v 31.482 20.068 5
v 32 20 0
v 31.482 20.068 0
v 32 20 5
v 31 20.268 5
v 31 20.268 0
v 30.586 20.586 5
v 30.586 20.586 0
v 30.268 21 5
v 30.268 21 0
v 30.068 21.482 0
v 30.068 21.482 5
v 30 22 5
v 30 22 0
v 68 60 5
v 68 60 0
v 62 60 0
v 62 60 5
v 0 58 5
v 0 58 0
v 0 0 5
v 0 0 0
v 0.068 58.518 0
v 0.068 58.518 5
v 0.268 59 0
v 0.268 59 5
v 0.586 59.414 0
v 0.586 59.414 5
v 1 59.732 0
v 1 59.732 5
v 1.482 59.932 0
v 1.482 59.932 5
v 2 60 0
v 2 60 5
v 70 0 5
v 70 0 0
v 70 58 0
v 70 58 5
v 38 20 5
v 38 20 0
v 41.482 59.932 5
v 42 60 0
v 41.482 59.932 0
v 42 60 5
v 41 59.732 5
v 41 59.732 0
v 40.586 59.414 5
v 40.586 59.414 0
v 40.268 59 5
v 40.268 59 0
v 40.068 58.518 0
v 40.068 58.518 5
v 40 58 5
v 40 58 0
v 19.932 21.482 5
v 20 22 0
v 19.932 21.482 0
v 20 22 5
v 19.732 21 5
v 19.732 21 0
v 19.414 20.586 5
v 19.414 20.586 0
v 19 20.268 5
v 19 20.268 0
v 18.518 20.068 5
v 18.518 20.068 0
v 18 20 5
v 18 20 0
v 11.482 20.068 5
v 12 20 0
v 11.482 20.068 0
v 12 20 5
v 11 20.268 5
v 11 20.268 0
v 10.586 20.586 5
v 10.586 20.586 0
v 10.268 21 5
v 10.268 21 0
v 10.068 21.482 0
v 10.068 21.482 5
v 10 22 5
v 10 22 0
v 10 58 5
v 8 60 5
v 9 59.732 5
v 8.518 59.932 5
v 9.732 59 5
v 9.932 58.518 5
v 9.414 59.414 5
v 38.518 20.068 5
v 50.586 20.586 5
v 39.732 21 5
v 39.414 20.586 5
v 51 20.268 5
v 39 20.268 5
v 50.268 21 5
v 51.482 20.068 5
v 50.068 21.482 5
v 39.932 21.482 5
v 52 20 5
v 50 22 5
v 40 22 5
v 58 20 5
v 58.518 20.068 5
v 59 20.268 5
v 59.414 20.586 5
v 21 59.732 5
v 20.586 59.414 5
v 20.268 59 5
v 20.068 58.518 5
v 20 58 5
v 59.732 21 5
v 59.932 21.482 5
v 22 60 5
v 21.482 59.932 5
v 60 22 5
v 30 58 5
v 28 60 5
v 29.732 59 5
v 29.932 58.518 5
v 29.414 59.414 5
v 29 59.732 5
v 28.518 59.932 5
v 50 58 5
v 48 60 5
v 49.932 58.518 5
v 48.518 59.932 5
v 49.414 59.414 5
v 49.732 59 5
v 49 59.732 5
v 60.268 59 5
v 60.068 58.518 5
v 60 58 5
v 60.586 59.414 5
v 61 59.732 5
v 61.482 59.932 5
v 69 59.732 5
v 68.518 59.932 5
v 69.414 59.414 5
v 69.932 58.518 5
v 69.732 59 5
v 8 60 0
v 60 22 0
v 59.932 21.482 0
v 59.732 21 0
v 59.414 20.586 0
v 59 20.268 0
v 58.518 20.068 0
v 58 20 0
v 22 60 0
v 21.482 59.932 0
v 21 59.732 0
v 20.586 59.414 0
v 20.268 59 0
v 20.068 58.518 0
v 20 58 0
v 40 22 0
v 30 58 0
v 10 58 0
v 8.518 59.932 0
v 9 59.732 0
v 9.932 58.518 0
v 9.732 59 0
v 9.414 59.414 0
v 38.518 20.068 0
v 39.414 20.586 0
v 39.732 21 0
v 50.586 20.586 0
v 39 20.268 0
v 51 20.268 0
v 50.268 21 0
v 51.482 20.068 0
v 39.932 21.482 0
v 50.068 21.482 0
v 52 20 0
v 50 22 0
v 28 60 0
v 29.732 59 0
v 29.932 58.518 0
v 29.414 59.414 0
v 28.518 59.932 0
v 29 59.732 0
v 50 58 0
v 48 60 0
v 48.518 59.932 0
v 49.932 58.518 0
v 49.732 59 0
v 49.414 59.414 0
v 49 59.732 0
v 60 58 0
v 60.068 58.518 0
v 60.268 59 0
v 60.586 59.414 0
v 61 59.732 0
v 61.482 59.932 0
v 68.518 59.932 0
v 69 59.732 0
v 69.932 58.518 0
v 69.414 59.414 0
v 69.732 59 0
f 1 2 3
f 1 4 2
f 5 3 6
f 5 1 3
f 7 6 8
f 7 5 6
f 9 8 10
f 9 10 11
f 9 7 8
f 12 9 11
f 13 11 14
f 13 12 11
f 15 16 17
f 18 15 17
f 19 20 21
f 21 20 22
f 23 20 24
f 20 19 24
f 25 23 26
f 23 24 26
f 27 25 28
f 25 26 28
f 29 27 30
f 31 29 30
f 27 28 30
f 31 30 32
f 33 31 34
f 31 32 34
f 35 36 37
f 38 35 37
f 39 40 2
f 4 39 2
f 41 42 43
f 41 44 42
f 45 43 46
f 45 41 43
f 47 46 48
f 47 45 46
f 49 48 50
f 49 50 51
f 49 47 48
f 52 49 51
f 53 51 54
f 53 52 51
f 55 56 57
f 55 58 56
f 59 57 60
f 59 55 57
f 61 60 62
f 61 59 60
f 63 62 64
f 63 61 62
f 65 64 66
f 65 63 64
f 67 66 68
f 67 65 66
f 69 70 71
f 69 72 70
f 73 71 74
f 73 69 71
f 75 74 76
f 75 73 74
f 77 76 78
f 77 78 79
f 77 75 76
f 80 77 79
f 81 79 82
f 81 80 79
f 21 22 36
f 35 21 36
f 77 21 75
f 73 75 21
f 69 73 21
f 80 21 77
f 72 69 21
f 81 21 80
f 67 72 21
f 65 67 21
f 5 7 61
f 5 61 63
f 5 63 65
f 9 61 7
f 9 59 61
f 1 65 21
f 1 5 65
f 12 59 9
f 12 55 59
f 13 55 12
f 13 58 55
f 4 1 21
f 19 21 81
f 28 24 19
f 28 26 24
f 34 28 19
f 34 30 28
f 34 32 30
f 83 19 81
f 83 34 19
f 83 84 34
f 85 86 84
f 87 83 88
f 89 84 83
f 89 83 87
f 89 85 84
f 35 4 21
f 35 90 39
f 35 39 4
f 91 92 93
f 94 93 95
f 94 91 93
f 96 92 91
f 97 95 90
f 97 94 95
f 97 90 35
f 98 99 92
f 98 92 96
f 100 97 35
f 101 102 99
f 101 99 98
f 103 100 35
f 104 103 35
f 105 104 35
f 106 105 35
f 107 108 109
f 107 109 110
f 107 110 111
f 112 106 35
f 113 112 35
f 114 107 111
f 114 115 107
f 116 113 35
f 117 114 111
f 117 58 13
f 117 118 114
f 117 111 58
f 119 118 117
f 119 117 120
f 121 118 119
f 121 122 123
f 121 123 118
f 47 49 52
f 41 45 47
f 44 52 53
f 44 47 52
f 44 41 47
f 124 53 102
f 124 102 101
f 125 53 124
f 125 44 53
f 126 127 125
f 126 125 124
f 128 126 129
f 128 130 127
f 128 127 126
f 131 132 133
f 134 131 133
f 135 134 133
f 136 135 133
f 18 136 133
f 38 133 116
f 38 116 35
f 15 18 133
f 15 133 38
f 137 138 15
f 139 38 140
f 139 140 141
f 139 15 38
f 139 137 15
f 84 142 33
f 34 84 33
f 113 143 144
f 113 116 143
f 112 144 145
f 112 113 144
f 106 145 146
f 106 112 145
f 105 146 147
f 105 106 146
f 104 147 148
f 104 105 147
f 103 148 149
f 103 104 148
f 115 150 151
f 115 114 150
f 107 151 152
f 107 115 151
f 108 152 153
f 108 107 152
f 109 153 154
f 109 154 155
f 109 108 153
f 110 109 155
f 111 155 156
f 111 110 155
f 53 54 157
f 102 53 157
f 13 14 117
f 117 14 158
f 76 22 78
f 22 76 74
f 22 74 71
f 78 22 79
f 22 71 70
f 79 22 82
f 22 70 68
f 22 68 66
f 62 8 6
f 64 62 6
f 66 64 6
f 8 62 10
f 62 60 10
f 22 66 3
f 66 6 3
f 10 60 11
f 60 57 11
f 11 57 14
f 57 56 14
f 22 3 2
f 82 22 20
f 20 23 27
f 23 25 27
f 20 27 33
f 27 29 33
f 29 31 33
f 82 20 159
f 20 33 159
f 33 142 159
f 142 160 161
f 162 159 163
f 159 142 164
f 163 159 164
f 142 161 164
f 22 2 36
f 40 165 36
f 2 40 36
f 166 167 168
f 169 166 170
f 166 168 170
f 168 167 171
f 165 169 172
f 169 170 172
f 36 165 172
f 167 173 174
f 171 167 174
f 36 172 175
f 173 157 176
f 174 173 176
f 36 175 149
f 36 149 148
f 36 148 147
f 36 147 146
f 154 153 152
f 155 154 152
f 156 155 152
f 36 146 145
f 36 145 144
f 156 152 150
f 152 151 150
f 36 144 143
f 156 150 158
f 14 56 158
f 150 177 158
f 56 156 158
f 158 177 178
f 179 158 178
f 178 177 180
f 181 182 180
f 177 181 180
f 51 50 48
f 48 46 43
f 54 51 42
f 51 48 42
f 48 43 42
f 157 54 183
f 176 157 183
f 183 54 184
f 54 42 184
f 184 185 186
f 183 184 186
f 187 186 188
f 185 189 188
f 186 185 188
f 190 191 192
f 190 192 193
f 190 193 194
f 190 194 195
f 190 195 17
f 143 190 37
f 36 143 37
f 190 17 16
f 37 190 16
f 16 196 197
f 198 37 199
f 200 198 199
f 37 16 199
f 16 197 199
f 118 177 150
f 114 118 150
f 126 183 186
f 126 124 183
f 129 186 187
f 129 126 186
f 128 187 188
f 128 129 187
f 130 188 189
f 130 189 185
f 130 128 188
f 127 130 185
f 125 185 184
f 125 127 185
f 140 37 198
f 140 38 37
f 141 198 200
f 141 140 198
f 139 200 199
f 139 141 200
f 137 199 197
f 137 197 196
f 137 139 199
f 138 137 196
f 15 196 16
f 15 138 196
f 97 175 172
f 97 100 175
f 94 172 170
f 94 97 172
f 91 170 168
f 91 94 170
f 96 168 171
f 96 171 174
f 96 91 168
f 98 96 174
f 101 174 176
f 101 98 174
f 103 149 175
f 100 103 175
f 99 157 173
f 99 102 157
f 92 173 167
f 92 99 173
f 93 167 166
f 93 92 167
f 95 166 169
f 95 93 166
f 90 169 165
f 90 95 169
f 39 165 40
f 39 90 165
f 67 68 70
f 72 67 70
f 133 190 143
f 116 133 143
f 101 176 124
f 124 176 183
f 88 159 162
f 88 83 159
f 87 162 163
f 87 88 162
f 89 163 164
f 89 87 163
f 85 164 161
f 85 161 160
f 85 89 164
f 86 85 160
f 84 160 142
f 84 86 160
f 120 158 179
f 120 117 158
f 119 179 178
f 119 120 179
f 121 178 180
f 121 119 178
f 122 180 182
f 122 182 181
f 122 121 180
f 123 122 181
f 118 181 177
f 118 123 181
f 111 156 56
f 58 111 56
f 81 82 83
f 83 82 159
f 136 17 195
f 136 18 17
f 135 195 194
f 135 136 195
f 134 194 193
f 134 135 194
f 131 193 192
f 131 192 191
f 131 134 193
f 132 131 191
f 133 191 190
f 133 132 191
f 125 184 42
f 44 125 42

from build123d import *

# Parameters (mm, degrees)
F1_DEPTH = 5
F2_R     = 2


with BuildPart() as f1:
    # F0 (on Top) → F1 (new body)
    with BuildSketch(Plane.XY):
        Polygon((0, 60), (0, 0), (70, 0), (70, 60), (60, 60), (60, 20), (50, 20), (50, 60), (40, 60), (40, 20), (30, 20), (30, 60), (20, 60), (20, 20), (10, 20), (10, 60), align=None)
    extrude(amount=F1_DEPTH)

    # F2
    f2_edges = [f1.edges().sort_by_distance(p)[0] for p in [
        (10, 60, 2.5),
        (0, 60, 2.5),
        (20, 60, 2.5),
        (30, 60, 2.5),
        (40, 60, 2.5),
        (50, 60, 2.5),
        (60, 60, 2.5),
        (70, 60, 2.5),
        (10, 20, 2.5),
        (20, 20, 2.5),
        (30, 20, 2.5),
        (40, 20, 2.5),
        (50, 20, 2.5),
        (60, 20, 2.5),
    ]]
    fillet(f2_edges, radius=F2_R)


solid = f1.part
